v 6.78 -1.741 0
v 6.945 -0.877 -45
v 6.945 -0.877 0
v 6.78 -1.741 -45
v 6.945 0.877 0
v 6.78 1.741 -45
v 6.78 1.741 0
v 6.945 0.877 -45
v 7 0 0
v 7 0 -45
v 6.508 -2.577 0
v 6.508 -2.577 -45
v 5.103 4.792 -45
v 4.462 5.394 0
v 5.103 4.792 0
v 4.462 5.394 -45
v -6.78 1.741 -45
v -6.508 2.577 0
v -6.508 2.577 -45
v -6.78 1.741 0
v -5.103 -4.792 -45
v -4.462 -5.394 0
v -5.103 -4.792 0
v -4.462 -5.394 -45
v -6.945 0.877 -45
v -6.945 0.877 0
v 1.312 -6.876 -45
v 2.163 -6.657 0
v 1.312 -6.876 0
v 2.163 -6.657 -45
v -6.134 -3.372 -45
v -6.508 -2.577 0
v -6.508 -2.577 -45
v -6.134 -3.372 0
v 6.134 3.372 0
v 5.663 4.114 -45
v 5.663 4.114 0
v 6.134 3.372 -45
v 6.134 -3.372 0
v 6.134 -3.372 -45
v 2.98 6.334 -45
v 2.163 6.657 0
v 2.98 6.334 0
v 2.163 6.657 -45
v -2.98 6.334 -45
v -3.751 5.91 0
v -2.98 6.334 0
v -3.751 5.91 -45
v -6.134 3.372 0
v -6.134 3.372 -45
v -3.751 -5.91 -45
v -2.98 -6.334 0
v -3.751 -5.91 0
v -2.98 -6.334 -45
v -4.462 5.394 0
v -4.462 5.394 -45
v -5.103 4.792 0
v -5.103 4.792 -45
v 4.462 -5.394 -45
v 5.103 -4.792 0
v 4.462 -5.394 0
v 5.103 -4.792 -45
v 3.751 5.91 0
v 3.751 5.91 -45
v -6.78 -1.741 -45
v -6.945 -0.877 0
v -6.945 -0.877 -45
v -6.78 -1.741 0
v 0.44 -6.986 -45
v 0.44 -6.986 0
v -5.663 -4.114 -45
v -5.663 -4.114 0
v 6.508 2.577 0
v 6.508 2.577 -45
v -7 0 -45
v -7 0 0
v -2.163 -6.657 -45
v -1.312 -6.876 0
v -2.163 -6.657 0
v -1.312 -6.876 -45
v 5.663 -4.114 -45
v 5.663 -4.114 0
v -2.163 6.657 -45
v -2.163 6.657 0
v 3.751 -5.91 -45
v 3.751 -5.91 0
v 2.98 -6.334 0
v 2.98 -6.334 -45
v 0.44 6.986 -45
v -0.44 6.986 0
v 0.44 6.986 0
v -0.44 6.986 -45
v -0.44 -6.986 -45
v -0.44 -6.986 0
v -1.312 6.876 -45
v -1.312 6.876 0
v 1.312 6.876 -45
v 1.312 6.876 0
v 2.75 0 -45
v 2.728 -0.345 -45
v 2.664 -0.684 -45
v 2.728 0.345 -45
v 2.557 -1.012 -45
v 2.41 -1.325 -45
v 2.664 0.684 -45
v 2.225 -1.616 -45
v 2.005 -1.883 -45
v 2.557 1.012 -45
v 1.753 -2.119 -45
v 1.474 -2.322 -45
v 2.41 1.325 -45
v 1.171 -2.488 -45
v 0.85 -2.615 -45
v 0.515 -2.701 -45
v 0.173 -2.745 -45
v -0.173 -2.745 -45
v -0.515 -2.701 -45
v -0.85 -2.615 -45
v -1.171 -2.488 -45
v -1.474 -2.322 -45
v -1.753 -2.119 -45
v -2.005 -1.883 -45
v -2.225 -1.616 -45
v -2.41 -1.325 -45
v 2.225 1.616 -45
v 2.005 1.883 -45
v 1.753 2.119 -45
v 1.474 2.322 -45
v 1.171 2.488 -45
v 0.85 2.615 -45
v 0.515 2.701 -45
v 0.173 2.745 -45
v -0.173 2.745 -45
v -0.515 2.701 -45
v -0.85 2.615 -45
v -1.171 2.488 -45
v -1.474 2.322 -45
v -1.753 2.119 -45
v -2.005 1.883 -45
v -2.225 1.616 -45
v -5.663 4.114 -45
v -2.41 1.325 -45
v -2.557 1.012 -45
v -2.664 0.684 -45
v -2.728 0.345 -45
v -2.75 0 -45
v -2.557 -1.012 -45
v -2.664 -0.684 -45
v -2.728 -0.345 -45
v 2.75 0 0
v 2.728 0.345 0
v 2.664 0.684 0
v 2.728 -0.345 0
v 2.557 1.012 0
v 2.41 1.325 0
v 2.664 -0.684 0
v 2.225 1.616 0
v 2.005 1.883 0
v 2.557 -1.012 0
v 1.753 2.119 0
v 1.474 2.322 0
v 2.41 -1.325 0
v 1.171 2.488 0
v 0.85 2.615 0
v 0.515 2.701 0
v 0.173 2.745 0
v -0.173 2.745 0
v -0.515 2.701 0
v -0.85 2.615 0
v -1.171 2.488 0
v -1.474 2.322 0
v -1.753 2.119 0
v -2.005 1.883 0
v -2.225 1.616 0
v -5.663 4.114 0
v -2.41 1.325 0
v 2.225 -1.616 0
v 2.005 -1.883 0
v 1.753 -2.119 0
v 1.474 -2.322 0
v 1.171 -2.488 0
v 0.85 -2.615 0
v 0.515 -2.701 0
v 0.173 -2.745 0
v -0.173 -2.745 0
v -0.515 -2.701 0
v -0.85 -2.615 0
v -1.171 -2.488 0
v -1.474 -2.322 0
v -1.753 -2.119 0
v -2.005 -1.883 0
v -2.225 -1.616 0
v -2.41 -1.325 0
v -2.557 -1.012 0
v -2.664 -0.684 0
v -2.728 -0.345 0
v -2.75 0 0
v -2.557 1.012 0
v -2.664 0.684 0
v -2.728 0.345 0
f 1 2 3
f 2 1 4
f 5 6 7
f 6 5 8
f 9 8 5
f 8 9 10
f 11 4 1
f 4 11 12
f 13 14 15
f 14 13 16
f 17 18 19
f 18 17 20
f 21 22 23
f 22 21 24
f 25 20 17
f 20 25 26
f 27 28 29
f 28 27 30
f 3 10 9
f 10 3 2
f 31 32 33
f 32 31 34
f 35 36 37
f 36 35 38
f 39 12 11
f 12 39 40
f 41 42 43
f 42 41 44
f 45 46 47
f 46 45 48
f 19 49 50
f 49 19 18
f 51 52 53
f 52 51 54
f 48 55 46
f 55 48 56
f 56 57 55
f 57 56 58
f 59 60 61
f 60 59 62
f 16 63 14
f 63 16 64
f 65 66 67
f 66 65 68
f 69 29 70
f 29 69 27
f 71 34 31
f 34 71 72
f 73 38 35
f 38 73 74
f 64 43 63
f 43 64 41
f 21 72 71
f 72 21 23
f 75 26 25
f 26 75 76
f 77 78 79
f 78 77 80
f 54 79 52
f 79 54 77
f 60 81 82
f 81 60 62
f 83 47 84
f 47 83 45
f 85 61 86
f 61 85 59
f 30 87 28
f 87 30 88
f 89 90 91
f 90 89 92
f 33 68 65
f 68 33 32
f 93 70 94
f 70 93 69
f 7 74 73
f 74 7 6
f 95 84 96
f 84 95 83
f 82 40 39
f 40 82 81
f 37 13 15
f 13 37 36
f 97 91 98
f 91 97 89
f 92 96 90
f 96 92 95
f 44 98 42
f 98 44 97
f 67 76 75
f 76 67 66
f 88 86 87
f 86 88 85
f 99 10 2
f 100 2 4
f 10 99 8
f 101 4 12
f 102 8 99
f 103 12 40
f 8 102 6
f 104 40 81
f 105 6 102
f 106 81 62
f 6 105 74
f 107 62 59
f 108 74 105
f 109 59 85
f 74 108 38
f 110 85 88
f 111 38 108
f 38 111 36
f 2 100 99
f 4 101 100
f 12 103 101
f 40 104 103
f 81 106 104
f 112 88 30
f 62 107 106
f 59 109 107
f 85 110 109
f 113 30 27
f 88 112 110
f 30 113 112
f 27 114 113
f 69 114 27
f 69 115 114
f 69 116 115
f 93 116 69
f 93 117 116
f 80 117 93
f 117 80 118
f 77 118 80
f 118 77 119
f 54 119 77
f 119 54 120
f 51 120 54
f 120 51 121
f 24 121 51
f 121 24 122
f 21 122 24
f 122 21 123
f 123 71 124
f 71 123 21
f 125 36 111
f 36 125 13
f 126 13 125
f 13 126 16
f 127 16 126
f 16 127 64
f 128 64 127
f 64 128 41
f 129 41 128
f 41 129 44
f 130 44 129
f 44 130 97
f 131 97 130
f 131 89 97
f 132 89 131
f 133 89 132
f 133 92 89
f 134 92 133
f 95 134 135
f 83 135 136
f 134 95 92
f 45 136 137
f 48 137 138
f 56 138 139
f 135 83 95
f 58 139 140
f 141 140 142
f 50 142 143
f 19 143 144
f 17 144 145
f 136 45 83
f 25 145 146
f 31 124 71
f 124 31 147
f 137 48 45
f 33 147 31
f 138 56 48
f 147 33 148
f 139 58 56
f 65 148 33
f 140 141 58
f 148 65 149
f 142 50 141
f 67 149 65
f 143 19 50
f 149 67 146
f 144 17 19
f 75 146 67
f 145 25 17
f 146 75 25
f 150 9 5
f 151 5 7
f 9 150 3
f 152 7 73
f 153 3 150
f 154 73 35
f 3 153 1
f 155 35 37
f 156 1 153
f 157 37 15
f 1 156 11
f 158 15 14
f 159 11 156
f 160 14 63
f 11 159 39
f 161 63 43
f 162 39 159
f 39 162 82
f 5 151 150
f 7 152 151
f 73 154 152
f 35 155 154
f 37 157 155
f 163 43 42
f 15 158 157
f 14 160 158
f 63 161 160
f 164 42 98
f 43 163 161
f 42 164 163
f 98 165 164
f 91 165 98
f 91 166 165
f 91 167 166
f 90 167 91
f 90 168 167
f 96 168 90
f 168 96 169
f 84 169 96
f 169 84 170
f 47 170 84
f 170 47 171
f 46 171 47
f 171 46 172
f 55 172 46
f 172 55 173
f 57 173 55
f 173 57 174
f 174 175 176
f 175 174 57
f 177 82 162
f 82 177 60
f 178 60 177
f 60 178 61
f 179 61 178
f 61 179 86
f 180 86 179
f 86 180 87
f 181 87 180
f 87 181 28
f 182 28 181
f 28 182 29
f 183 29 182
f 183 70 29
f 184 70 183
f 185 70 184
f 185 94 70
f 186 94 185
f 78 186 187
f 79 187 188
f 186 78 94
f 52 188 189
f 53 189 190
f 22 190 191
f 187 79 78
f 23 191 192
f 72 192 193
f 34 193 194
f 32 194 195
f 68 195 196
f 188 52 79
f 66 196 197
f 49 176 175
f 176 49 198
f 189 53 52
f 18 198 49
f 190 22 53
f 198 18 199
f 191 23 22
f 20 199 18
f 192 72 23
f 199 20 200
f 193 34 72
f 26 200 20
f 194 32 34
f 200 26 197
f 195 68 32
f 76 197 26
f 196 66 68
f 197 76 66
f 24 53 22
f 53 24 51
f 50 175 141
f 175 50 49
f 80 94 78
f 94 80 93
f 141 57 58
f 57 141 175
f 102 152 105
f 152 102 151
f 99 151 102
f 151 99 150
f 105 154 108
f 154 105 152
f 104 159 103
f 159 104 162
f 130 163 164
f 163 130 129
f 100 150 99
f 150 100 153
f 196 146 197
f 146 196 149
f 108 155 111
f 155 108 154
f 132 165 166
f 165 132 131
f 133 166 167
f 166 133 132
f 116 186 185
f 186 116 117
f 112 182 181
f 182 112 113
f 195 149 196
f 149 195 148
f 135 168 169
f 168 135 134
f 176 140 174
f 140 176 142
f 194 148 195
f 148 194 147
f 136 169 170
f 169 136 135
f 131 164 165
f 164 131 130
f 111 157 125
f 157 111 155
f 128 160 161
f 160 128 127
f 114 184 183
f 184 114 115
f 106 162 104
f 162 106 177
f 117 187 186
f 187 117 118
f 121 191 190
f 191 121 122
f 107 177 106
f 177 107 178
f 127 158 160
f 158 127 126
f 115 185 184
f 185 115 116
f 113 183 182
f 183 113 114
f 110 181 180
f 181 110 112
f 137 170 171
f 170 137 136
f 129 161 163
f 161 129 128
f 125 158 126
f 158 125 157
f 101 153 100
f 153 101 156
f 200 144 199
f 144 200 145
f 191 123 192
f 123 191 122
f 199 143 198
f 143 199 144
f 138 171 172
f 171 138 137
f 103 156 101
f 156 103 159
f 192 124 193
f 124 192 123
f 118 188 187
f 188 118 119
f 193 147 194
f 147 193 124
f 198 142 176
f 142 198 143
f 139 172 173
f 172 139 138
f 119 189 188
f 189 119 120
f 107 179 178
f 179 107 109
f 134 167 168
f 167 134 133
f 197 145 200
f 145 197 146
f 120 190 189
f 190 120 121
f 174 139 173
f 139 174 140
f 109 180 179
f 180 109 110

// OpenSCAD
$fn = 50;


difference() {
	union() {
		translate(v = [0, 0, -45.0000000000]) {
			cylinder(h = 45, r = 7.0000000000);
		}
		cylinder(h = 0, r = 10.0000000000);
	}
	union() {
		#translate(v = [0, 0, -45]) {
			cylinder(h = 45, r = 2.7500000000);
		}
	}
}
